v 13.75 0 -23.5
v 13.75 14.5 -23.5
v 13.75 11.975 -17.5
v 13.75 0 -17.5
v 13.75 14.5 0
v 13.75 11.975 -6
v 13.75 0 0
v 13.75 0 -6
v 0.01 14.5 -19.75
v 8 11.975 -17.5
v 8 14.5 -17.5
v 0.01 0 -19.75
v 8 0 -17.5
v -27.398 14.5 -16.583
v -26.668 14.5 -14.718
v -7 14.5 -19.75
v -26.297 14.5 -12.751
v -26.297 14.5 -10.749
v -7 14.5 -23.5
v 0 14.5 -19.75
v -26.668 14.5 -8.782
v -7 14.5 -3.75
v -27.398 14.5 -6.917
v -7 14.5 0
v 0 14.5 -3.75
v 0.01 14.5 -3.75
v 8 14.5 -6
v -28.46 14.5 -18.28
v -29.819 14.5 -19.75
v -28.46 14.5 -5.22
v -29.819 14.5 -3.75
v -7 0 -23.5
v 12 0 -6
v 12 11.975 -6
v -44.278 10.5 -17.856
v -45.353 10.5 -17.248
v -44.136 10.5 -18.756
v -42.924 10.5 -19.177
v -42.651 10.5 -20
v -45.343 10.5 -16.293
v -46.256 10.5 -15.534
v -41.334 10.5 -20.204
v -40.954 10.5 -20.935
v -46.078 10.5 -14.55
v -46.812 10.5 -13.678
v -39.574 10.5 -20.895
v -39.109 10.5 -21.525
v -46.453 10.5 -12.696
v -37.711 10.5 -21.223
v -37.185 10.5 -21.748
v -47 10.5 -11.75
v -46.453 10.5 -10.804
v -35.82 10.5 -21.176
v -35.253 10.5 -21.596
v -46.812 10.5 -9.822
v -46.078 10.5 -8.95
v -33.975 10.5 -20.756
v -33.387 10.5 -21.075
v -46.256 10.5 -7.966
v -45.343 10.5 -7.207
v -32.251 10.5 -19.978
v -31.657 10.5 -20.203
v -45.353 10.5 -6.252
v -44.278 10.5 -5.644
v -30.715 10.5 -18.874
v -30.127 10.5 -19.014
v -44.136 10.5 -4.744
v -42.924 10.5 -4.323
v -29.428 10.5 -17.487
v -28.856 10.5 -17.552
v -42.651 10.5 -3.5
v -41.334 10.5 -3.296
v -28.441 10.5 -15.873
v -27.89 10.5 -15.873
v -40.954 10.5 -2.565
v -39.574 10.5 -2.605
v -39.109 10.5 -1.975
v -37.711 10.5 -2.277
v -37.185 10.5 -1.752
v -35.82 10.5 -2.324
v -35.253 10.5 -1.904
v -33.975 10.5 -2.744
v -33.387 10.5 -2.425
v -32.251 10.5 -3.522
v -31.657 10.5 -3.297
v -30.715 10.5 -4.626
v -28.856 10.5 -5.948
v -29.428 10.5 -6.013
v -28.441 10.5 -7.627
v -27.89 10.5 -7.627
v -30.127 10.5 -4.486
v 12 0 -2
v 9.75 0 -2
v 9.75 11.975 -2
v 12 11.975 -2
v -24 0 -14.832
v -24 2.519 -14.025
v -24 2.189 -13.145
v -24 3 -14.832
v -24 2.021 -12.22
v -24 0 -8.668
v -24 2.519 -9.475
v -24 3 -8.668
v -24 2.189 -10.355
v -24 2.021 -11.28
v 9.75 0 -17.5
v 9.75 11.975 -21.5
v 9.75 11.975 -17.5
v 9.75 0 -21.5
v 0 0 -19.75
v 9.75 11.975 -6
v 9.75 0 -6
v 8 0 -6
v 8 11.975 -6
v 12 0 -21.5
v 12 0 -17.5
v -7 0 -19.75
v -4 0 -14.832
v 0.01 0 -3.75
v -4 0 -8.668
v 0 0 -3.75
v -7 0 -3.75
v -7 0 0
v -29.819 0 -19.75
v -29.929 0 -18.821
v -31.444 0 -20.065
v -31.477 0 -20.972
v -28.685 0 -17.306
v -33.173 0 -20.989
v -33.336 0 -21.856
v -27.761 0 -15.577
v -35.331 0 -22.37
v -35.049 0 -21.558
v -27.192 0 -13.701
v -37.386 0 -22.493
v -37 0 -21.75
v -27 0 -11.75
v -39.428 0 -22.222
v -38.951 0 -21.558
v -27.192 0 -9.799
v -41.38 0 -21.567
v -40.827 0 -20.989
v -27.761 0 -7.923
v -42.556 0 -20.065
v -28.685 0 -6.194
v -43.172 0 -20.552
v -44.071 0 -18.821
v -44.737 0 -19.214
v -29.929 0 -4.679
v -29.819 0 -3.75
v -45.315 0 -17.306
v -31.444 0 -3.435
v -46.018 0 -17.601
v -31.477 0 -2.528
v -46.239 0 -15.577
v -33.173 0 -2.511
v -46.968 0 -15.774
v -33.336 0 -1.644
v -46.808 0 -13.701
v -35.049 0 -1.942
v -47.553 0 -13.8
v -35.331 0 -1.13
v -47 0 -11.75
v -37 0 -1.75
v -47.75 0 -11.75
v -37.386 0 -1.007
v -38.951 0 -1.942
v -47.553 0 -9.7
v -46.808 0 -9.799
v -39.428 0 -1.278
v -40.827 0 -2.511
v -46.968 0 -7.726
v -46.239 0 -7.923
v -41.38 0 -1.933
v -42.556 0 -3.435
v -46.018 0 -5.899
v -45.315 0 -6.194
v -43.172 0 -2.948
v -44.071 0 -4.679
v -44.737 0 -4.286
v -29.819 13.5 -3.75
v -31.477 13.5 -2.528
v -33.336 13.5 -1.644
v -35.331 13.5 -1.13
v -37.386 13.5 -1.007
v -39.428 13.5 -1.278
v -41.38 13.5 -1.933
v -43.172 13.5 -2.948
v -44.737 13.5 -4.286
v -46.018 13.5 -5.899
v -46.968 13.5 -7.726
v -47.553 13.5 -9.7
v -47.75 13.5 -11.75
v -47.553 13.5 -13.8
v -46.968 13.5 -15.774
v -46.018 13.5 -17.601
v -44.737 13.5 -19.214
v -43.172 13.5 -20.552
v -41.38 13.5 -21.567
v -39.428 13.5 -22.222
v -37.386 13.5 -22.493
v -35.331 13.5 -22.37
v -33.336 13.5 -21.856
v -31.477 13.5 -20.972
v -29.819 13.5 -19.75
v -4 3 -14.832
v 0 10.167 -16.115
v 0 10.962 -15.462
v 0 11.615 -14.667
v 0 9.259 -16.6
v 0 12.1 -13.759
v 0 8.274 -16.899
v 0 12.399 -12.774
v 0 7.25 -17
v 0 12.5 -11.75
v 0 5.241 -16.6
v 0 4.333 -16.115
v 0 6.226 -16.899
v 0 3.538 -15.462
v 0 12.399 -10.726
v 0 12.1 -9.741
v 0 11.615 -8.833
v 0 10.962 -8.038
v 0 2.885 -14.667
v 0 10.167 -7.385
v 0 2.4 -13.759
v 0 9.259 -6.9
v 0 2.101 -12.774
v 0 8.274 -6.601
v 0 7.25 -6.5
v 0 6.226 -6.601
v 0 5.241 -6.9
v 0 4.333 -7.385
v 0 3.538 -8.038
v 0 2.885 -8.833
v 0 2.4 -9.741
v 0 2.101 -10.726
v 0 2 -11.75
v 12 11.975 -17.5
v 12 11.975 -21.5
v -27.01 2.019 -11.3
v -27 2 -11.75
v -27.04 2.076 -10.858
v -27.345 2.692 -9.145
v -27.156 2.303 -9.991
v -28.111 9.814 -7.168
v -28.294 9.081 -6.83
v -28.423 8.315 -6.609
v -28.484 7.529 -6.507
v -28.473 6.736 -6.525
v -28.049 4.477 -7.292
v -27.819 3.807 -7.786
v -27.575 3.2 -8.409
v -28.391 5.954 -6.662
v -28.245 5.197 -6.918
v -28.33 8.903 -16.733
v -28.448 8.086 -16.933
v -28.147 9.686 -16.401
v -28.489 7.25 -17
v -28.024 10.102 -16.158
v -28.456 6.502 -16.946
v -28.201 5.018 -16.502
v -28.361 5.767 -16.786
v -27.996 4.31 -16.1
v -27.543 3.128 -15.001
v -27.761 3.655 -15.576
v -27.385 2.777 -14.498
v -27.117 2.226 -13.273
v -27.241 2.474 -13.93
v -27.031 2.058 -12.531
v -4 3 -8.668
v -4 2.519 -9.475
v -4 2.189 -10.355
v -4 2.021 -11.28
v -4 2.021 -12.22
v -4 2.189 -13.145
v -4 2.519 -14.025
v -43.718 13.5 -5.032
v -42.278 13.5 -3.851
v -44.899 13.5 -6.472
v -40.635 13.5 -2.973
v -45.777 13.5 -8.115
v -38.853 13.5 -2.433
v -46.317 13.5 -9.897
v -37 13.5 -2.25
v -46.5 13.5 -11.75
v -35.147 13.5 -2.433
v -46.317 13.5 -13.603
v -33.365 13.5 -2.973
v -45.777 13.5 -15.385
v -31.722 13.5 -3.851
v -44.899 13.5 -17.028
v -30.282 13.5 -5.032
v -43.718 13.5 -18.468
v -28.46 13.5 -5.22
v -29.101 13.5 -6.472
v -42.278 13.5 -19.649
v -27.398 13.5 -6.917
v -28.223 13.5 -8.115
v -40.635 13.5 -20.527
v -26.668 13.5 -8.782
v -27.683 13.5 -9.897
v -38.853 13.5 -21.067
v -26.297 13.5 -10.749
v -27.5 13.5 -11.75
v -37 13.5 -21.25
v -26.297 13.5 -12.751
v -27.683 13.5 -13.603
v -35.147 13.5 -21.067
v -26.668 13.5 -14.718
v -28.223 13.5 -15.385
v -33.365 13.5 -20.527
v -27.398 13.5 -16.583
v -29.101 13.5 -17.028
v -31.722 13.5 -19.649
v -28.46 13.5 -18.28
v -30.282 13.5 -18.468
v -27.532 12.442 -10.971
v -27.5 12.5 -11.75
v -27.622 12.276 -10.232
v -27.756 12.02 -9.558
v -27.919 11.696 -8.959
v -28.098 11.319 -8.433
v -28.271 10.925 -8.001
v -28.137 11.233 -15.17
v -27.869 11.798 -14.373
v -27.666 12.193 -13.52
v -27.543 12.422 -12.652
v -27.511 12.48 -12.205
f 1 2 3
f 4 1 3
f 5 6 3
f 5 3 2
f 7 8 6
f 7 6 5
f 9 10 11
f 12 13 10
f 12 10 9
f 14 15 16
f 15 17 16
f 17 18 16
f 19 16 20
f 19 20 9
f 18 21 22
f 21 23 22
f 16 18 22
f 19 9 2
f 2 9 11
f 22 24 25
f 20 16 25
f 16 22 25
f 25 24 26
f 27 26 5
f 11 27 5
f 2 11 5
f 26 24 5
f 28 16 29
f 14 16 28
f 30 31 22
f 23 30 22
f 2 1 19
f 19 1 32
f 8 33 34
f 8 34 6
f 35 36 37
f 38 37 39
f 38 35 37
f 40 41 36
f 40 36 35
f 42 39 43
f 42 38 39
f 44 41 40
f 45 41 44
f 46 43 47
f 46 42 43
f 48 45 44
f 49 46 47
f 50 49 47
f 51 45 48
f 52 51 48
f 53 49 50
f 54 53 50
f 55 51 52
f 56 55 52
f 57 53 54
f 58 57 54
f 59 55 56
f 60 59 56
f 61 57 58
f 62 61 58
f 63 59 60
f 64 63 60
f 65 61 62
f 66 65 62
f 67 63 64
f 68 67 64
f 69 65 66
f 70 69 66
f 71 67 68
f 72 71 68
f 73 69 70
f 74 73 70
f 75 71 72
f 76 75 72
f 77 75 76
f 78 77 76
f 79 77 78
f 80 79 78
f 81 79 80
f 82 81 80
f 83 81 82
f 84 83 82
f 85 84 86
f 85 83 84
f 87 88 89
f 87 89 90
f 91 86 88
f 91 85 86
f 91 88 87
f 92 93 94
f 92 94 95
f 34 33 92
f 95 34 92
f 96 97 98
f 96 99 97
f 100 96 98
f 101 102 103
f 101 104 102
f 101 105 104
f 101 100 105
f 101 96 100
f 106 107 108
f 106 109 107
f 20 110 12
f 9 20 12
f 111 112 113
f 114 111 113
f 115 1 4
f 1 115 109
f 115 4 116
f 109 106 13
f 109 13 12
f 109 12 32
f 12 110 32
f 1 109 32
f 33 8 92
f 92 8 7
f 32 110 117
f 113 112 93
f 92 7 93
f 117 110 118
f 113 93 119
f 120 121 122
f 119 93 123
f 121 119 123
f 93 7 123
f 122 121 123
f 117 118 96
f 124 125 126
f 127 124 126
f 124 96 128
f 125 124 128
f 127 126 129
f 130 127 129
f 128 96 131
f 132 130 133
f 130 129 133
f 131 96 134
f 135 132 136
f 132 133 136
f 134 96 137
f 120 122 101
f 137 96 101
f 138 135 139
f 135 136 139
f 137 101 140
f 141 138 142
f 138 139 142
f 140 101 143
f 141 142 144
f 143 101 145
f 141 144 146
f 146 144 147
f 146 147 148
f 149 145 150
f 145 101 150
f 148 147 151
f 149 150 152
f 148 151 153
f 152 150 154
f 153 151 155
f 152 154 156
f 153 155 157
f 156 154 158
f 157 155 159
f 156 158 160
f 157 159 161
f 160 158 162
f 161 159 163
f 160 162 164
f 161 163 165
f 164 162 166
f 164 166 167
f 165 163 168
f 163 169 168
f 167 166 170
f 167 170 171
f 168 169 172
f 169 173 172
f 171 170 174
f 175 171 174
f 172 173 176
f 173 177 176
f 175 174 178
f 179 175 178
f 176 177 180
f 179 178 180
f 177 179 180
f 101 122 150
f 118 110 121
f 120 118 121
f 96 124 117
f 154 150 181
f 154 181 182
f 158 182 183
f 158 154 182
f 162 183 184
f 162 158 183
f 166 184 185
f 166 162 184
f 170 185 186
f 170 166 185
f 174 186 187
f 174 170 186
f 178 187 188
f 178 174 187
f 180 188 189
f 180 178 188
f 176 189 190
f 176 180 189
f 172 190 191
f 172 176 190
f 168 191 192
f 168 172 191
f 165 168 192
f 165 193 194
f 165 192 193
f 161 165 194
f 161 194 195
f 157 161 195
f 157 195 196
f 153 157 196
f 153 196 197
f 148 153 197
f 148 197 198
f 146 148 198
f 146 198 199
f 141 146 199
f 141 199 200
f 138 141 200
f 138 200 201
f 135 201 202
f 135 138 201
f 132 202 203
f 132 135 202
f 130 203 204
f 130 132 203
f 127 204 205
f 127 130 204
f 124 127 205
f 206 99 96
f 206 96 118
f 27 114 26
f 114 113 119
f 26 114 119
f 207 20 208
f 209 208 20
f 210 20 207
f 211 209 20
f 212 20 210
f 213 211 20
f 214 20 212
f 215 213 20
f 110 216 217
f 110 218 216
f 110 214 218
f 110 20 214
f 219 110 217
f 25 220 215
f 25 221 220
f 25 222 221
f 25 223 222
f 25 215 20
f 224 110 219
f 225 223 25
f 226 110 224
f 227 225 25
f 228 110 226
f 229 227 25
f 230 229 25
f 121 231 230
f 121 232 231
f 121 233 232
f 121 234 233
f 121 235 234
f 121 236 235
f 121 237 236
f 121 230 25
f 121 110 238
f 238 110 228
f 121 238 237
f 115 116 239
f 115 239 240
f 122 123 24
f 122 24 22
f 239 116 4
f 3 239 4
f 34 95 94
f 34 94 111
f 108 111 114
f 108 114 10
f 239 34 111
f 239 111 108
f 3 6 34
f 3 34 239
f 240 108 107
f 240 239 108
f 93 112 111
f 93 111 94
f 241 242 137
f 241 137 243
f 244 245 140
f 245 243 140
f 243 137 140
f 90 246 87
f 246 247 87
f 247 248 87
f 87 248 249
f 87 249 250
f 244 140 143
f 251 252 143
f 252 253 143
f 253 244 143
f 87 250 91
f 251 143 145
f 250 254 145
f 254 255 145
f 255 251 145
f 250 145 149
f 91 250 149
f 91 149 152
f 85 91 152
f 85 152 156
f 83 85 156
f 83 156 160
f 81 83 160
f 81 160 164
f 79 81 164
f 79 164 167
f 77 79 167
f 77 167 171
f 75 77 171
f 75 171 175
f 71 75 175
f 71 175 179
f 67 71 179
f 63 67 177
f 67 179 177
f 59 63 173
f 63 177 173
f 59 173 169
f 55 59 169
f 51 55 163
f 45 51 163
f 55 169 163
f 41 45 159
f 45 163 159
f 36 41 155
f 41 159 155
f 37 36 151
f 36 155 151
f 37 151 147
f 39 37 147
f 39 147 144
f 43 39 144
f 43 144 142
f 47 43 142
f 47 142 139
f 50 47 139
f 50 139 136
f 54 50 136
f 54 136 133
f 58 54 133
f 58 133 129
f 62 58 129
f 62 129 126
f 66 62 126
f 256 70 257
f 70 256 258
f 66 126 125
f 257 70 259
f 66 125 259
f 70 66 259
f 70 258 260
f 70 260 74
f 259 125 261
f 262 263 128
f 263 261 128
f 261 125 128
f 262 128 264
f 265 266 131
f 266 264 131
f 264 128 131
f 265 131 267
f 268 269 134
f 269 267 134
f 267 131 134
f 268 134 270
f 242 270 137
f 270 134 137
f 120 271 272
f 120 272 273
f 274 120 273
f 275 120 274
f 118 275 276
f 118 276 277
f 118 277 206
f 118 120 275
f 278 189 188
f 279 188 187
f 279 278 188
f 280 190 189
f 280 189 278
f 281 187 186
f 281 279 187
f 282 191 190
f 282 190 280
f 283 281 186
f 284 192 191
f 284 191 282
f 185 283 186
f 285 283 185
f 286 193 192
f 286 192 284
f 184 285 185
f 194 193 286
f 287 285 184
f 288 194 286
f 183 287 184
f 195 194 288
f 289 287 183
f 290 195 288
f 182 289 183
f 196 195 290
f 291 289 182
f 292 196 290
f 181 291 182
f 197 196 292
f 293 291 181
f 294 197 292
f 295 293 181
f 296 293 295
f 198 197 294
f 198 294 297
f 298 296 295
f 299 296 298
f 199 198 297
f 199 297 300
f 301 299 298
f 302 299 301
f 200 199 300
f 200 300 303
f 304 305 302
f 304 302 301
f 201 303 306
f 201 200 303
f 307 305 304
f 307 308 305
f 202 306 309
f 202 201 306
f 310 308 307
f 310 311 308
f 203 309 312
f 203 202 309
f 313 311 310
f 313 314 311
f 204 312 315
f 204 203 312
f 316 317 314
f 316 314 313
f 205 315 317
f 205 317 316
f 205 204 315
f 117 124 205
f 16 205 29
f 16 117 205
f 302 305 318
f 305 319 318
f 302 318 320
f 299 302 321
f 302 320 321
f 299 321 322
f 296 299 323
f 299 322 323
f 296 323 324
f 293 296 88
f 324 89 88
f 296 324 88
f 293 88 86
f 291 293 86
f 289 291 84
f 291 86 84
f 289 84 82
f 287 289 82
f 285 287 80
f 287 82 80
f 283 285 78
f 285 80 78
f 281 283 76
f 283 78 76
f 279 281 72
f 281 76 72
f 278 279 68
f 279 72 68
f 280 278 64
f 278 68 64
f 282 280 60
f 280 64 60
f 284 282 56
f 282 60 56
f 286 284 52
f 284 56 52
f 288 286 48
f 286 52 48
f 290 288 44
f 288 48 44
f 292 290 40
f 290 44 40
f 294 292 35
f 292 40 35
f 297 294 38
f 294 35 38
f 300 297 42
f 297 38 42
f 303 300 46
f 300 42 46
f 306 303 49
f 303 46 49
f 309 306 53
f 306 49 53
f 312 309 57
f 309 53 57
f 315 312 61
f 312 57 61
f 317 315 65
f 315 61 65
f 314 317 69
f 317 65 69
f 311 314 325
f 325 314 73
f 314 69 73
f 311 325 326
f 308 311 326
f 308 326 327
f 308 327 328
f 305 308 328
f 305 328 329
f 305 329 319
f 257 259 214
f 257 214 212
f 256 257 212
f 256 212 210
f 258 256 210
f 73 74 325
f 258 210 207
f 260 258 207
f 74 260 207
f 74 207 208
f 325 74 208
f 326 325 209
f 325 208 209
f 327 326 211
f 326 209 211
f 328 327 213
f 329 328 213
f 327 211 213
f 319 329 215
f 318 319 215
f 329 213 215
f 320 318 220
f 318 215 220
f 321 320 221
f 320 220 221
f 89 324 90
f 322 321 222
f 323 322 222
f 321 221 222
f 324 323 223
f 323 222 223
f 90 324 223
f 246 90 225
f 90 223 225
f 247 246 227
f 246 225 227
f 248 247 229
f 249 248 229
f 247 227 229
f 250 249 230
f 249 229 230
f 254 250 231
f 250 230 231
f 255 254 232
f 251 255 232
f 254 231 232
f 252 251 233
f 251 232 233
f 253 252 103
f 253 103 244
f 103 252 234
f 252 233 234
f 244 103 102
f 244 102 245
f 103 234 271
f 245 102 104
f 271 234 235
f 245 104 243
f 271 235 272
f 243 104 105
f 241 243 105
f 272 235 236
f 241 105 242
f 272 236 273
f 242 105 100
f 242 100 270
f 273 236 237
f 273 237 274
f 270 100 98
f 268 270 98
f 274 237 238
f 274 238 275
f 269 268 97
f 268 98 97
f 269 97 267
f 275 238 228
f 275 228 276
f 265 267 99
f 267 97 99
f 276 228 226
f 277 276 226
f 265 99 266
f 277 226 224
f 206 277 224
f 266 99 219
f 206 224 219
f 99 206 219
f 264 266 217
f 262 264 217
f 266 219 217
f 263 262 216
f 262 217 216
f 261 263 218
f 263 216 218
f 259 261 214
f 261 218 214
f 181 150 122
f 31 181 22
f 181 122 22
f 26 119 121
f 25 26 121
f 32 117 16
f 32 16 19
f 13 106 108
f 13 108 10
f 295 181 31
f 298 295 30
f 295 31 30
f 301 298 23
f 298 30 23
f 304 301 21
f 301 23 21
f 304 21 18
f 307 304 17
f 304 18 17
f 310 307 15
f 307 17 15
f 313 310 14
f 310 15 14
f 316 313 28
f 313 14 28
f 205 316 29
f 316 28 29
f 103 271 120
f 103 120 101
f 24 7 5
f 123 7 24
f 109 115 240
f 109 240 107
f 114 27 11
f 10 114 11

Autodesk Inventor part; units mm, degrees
ref_plane "YZ Plane" through (0, 0, 0) normal (1, 0, 0) x (0, 1, 0)
ref_plane "XZ Plane" through (0, 0, 0) normal (0, 1, 0) x (-1, 0, 0)
ref_plane "XY Plane" through (0, 0, 0) normal (0, 0, 1) x (1, 0, 0)
sketch "Sketch1" plane through (0, 0, 0) normal (0, 1, 0) x (-1, 0, 0)
  line L0 (0, 0) -> (7, 0)
  line L1 (7, -23.495) -> (0, -23.495)
  line L2 (-11.75, -2) -> (-11.75, -21.5)
  line L3 (-11.75, -9.75) -> (-10, -9.75)
  line L4 (-10, -2) -> (-10, -21.5)
  line L5 (-11.75, -0.1283) -> (-10, -0.1283)
  line L6 (-10, -2) -> (-10, -6)
  line L7 (-11.75, -6) -> (-13.75, -6)
  line L8 (-13.75, -6) -> (-13.75, 0)
  line L9 (-10, -6) -> (-8, -6)
  line L10 (-8, -6) -> (-8, 0)
  line L11 (-8, 0) -> (-13.75, 0)
  line L12 (-10, -21.5) -> (-10, -17.5)
  line L13 (-10, -17.5) -> (-8, -17.5)
  line L14 (-8, -17.5) -> (-8, -23.5)
  line L15 (-10, -2) -> (-11.75, -2)
  line L16 (-11.75, -6) -> (-11.75, -2)
  line L17 (-10, -21.5) -> (-11.75, -21.5)
  line L18 (-11.75, -21.5) -> (-11.75, -17.5)
  line L19 (-11.75, -17.5) -> (-13.75, -17.5)
  line L20 (-13.75, -17.5) -> (-13.75, -23.5)
  line L21 (-13.75, -23.5) -> (-8, -23.5)
  line L22 (-0.01, -3.75) -> (7, -3.75)
  line L23 (-8, -6) -> (-0.01, -3.75)
  line L24 (-8, 0) -> (7, 0)
  line L25 (7, 0) -> (7, -3.75)
  line L26 (-8, -23.5) -> (7, -23.5)
  line L27 (7, -23.5) -> (7, -19.75)
  line L28 (7, -19.75) -> (-0.01, -19.75)
  line L29 (-8, -17.5) -> (-0.01, -19.75)
  line L30 (7, -23.5) -> (0, -23.5)
  line L31 (0, -23.5) -> (0, 0)
  line L32 (0, 0) -> (7, 0)
  line L33 (7, 0) -> (7, -23.5)
  line L34 (-10, -21.5) -> (-9.75, -21.5)
  line L35 (-9.75, -21.5) -> (-9.75, -17.5)
  line L36 (-9.75, -17.5) -> (-10, -17.5)
  line L37 (-10, -17.5) -> (-10, -21.5)
  line L38 (-11.75, -17.5) -> (-12, -17.5)
  line L39 (-12, -17.5) -> (-12, -21.5)
  line L40 (-12, -21.5) -> (-11.75, -21.5)
  line L41 (-11.75, -21.5) -> (-11.75, -17.5)
  line L42 (-10, -6) -> (-9.75, -6)
  line L43 (-9.75, -6) -> (-9.75, -2)
  line L44 (-9.75, -2) -> (-10, -2)
  line L45 (-10, -2) -> (-10, -6)
  line L46 (-11.75, -6) -> (-12, -6)
  line L47 (-12, -6) -> (-12, -2)
  line L48 (-12, -2) -> (-11.75, -2)
  line L49 (-11.75, -2) -> (-11.75, -6)
  dimension "d0" = 23.495
  dimension "d1" = 7
  dimension "d2" = 4
  dimension "d3" = 2
  dimension "d4" = 6
  dimension "d5" = 2
  dimension "d6" = 4
  dimension "d7" = 2
  dimension "d8" = 6
  dimension "d9" = 2
  dimension "d10" = 15
  dimension "d11" = 15
  dimension "d12" = 0.25
  dimension "d13" = 0.25
  dimension "d14" = 0.25
  dimension "d15" = 0.25
extrude "Extrusion1" add sketch "Sketch1" along normal blind 14.5 contours L31 L22 L23 L10 L24 | L0 L25 L22 L31 | L10 L9 L43 L44 L15 L48 L47 L7 L8 L11 | L22 L33 L28 L31 | L31 L26 L14 L29 L28 | L28 L27 L1 L31 | L1 L27 L26 L31 | L14 L21 L20 L19 L39 L40 L17 L34 L35 L13
sketch "Sketch2" plane through (-7, 0, -23.5) normal (-1, 0, 0) x (0, 0, 1)
  line L0 (23.5, 0) -> (19.75, 0)
  line L1 (19.75, 0) -> (3.75, 0) projected
  line L2 (19.75, 0) -> (19.75, 14.5) projected
  line L3 (19.75, 0) -> (19.75, 14.5)
  line L4 (6, 0) -> (0, 0) projected
  line L5 (0, 0) -> (3.75, 0)
  line L6 (3.75, 0) -> (3.75, 14.5) projected
  line L7 (3.75, 0) -> (3.75, 14.5)
  line L8 (3.75, 0) -> (19.75, 0)
  line L9 (19.75, 0) -> (19.75, 14.5)
  line L10 (19.75, 14.5) -> (3.75, 14.5)
  line L11 (3.75, 14.5) -> (3.75, 0)
  dimension "d18" = 3.75
  dimension "d19" = 3.75
extrude "Extrusion2" add sketch "Sketch2" along normal blind 30
sketch "Sketch3" plane through (0, 0, 0) normal (0, -1, 0) x (1, 0, 0)
  line L0 (-37, -19.75) -> (-37, -3.75) projected
  circle A0 centre (-37, -11.75) radius 10.75
  point P0 (0, 0)
  dimension "d22" = 21.5
extrude "Extrusion3" add sketch "Sketch3" against normal blind 14.5
sketch "Sketch4" plane through (0, 0, 0) normal (0, -1, 0) x (1, 0, 0)
  arc A0 (-29.8193, -3.75) -> (-29.8193, -19.75) centre (-37, -11.75) ccw projected
  circle A1 centre (-37, -11.75) radius 10
  point P0 (0, 0)
  dimension "d25" = 20
extrude "Extrusion4" cut sketch "Sketch4" against normal blind 10.5
sketch "Sketch5" plane through (-37, 10.5, -11.75) normal (0, -1, 0) x (1, 0, 0)
  circle A0 centre (0, 0) radius 10 projected
  circle A1 centre (0, 0) radius 9.5
  point P0 (37, 11.75)
  dimension "d28" = 19
extrude "Extrusion5" cut sketch "Sketch5" against normal blind 10.5 contours A1
sketch "Sketch6" plane through (0, 0, -3.75) normal (1, 0, 0) x (0, 0, -1)
  circle A0 centre (8, 7.25) radius 5.25
  point P0 (-3.75, 0)
  dimension "d31" = 10.5
extrude "Extrusion6" cut sketch "Sketch6" against normal blind 40
sketch "Sketch7" plane through (0, 14.5, 0) normal (0, 1, 0) x (1, 0, 0)
  arc A0 (-29.8193, 19.75) -> (-29.8193, 3.75) centre (-37, 11.75) ccw projected
  circle A1 centre (-37, 11.75) radius 10.75
  point P0 (0, 0)
  dimension "d50" = 21.5
extrude "Extrusion7" cut sketch "Sketch7" against normal blind 1
sketch "Sketch9" plane through (0, 0, 0) normal (0, -1, 0) x (1, 0, 0)
  line L0 (-7, -19.75) -> (-29.8193, -19.75) projected
  line L1 (-7, -19.75) -> (-4, -19.75)
  line L2 (-4, -19.75) -> (-4, -16.75)
  line L3 (-7, -3.75) -> (-7, 0) projected
  line L4 (-7, -3.75) -> (-4, -3.75)
  line L5 (-4, -3.75) -> (-4, -6.75)
  line L6 (-4, -16.75) -> (-24, -16.75)
  line L7 (-24, -16.75) -> (-24, -6.75)
  line L8 (-24, -6.75) -> (-4, -6.75)
  line L9 (-4, -6.75) -> (-4, -16.75)
  point P0 (0, 0)
  point P1 (-29.0904, -19.75)
  dimension "d39" = 3
  dimension "d40" = 3
  dimension "d41" = 3
  dimension "d42" = 3
  dimension "d43" = 20
extrude "Extrusion9" cut sketch "Sketch9" against normal blind 3
sketch "Sketch10" plane through (0, 3, 0) normal (0, -1, 0) x (1, 0, 0)
  line L0 (-4, -8.6678) -> (-24, -8.6678) projected
  line L1 (-4, -6.75) -> (-4, -8.6678) projected
  line L2 (-24, -6.75) -> (-4, -6.75) projected
  line L3 (-24, -8.6678) -> (-24, -6.75) projected
  line L4 (-24, -14.8322) -> (-4, -14.8322) projected
  line L5 (-24, -16.75) -> (-24, -14.8322) projected
  line L6 (-4, -16.75) -> (-24, -16.75) projected
  line L7 (-4, -14.8322) -> (-4, -16.75) projected
  point P0 (0, 0)
extrude "Extrusion10" add sketch "Sketch10" along normal blind 3
sketch "Sketch11" plane through (13.75, 0, -17.5) normal (1, 0, 0) x (0, 0, -1)
  line L0 (-15.5, 11.975) -> (4, 11.975) projected
  line L1 (4, 0) -> (4, 14.5) projected
  line L2 (4, 11.975) -> (4, 14.5)
  line L3 (4, 14.5) -> (-15.625, 14.5)
  line L4 (-13.75, 14.5) -> (-17.5, 14.5) projected
  line L5 (-15.5, 0) -> (-15.5, 14.5) projected
  line L6 (-15.5, 11.975) -> (-15.5, 14.5)
  line L7 (4, 11.975) -> (-15.5, 11.975)
  line L8 (-15.5, 14.5) -> (4, 14.5)
  point P0 (-17.5, 0)
extrude "Extrusion11" add sketch "Sketch11" against normal blind 5.75
properties part number "PistonV2"
